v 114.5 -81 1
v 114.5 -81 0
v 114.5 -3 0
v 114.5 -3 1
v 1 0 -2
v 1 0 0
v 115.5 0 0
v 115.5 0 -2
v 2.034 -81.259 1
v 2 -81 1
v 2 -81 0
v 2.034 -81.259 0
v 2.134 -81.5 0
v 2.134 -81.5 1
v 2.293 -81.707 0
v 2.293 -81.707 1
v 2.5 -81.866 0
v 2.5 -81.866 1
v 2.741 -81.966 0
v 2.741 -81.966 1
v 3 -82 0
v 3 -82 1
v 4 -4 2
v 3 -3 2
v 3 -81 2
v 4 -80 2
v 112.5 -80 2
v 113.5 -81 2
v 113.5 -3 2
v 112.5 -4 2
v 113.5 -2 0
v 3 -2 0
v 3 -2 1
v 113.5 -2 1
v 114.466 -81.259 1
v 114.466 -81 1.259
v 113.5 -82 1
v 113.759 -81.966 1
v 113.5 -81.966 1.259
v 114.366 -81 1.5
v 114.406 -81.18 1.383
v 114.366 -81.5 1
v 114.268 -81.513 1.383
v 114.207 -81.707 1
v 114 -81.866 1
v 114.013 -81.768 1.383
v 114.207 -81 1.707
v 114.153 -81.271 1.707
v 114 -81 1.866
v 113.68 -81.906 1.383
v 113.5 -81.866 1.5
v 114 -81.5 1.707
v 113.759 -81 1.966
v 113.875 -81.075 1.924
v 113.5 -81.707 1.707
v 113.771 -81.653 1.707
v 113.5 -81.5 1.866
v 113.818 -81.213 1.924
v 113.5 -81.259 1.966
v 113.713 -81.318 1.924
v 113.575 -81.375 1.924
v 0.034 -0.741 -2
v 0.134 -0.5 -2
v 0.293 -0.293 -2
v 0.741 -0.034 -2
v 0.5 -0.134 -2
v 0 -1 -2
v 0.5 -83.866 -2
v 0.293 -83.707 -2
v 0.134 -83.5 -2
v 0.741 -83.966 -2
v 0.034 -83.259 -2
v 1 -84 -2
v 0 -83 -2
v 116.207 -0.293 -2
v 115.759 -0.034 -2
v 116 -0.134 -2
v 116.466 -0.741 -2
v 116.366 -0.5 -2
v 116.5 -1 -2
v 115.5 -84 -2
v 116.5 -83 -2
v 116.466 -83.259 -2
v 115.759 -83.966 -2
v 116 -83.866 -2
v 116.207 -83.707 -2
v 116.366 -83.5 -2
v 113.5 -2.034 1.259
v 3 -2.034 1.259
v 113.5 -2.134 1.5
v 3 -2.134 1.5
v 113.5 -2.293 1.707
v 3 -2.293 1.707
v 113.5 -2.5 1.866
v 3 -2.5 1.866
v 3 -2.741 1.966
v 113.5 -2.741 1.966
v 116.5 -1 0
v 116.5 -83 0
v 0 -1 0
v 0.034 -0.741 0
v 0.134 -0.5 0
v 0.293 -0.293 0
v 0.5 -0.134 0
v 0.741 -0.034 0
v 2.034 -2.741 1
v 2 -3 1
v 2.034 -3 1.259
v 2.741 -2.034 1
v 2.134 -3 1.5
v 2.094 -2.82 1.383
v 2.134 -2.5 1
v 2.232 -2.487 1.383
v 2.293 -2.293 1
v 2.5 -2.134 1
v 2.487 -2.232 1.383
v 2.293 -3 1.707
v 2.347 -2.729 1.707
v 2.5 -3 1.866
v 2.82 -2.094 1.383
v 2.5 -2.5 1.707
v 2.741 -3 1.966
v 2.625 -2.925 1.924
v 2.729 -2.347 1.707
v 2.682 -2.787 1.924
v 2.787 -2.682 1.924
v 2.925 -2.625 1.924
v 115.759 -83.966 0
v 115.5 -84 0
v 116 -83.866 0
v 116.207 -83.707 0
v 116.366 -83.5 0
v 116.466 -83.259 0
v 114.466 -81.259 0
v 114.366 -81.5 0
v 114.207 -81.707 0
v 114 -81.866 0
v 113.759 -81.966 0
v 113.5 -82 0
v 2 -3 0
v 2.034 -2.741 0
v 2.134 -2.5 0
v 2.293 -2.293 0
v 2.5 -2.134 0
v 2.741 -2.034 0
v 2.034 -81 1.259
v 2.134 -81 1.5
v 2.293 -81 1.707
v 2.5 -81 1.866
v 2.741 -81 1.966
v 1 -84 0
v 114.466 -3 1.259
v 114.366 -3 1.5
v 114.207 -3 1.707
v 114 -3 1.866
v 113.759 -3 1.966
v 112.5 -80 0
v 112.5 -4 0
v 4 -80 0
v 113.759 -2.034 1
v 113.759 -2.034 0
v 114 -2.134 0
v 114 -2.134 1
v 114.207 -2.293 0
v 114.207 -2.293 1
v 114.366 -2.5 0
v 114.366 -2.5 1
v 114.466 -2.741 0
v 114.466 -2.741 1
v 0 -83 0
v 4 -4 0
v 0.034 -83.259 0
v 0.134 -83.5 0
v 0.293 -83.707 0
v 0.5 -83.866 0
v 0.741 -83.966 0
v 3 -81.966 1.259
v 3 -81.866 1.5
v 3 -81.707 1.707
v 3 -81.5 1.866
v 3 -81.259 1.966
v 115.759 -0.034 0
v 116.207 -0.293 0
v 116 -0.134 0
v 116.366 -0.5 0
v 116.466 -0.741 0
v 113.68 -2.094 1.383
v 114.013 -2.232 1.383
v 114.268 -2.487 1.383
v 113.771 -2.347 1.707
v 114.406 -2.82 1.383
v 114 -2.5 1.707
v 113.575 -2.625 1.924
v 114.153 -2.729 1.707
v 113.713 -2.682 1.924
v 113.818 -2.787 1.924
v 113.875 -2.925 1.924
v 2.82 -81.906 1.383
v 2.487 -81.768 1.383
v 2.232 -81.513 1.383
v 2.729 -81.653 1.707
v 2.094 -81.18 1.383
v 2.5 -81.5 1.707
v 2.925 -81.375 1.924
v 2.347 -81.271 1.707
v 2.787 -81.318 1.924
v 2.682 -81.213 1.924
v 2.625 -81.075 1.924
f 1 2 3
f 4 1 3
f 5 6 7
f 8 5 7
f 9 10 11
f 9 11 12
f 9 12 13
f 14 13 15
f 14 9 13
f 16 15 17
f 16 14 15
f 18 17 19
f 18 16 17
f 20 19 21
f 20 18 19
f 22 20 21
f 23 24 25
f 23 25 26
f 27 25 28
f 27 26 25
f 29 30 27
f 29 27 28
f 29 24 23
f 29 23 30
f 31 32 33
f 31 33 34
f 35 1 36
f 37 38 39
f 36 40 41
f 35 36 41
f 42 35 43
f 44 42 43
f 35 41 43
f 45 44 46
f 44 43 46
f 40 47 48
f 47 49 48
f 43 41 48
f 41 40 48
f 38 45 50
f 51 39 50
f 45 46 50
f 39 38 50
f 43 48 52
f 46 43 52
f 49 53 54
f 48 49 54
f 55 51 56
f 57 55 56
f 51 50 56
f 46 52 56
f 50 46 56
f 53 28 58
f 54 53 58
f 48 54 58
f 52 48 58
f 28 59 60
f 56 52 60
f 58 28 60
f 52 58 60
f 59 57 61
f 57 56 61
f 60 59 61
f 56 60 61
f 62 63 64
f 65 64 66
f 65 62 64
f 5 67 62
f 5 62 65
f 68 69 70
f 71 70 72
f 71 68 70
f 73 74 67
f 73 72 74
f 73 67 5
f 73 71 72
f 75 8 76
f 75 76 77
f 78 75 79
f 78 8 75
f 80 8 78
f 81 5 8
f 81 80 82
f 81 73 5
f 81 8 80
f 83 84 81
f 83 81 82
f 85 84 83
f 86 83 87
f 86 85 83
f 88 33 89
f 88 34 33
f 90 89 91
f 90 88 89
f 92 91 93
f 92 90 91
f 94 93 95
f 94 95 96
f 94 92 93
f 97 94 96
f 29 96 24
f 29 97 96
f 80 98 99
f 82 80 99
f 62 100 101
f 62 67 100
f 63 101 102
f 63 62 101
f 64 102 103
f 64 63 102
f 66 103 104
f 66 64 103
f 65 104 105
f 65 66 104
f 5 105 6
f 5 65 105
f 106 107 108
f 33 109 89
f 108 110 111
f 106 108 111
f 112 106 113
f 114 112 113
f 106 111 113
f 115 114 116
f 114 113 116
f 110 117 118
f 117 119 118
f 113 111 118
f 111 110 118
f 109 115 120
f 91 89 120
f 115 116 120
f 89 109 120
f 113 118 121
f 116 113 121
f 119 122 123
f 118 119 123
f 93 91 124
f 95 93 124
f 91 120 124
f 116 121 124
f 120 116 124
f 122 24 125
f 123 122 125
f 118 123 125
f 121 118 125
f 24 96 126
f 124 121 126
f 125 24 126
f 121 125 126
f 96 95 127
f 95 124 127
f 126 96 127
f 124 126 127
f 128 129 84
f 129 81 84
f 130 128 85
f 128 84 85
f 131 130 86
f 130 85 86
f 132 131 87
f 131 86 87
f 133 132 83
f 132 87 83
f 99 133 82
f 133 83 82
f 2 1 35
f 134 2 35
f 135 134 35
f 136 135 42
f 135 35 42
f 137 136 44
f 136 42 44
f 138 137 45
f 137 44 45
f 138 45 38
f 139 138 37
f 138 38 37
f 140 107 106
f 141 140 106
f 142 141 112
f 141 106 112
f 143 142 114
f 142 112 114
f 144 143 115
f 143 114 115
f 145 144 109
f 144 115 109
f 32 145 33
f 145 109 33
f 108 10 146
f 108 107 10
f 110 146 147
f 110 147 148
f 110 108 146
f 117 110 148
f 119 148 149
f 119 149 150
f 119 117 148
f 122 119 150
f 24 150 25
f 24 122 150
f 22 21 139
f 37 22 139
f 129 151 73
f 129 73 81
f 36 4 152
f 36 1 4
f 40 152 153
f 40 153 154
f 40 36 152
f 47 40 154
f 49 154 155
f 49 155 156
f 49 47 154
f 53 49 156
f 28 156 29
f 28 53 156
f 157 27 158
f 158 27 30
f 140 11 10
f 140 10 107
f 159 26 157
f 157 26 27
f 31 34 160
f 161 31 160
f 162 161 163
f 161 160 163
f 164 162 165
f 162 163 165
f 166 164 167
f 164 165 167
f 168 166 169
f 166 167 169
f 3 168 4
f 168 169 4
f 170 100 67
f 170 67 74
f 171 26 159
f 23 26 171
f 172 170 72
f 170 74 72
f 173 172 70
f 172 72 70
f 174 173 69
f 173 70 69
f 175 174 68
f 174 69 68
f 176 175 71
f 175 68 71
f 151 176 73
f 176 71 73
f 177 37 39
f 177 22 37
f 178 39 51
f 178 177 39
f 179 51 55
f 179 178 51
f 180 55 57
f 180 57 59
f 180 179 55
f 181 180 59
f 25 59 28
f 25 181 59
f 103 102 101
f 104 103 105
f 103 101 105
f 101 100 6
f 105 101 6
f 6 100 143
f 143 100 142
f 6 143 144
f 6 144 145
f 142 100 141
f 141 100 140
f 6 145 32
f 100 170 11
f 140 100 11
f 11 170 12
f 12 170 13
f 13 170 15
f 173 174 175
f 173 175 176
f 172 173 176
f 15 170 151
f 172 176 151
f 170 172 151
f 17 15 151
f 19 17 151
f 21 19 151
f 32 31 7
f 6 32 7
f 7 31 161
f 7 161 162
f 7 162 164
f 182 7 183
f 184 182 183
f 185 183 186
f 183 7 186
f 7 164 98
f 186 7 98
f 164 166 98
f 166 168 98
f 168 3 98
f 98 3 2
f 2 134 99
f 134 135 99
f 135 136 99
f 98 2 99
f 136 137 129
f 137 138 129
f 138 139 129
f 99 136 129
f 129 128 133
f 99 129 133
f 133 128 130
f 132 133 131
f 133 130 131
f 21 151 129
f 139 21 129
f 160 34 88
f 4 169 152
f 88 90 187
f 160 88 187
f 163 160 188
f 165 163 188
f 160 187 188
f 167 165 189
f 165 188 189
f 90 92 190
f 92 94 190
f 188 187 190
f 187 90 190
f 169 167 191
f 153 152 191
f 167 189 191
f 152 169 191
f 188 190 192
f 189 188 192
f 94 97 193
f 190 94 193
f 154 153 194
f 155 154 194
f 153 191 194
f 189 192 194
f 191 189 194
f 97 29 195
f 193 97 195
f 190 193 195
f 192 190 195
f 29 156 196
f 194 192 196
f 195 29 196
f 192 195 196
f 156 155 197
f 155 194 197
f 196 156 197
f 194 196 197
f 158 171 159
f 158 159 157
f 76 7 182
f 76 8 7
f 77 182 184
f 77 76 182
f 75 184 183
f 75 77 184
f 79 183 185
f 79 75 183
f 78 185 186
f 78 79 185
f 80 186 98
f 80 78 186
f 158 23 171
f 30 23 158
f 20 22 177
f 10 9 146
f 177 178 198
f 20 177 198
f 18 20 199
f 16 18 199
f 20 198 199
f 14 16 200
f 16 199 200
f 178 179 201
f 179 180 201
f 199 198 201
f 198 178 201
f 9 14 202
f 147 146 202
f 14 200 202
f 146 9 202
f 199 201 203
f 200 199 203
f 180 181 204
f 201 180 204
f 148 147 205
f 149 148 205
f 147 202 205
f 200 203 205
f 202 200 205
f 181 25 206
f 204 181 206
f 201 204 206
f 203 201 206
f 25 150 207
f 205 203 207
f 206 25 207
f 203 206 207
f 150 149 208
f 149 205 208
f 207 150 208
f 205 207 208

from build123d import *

# Parameters (mm, degrees)
SKETCH007_W     = 116.5
SKETCH007_H     = 84
PAD002_DEPTH    = 2
SKETCH008_W     = 112.5
SKETCH008_H     = 80
PAD003_DEPTH    = 2
SKETCH009_W     = 108.5
SKETCH009_H     = 76
POCKET004_DEPTH = 2
FILLET008_R     = 1
FILLET009_R     = 1


with BuildPart() as part:
    # Sketch007 → Pad002 (new body)
    with BuildSketch(Plane(origin=(0, 0, 0), x_dir=(1, 0, 0), z_dir=(0, 0, -1))):
        with Locations((58.25, 42)):
            Rectangle(SKETCH007_W, SKETCH007_H)
    extrude(amount=PAD002_DEPTH)

    # Sketch008 (on Face5 of Pad002) → Pad003 (new body)
    with BuildSketch(Plane.XY):
        with Locations((58.25, -42)):
            Rectangle(SKETCH008_W, SKETCH008_H)
    extrude(amount=PAD003_DEPTH)

    # Sketch009 (on Face11 of Pad003) → Pocket004 (cut)
    with BuildSketch(Plane.XY.offset(2)):
        with Locations((58.25, -42)):
            Rectangle(SKETCH009_W, SKETCH009_H)
    extrude(amount=-POCKET004_DEPTH, mode=Mode.SUBTRACT)

    # Fillet008
    fillet008_edges = [part.edges().sort_by_distance(p)[0] for p in [
        (0, 0, -1),
        (116.5, 0, -1),
        (0, -84, -1),
        (116.5, -84, -1),
        (114.5, -82, 1),
        (2, -82, 1),
        (114.5, -2, 1),
        (2, -2, 1),
    ]]
    fillet(fillet008_edges, radius=FILLET008_R)

    # Fillet009
    fillet009_edges = [part.edges().sort_by_distance(p)[0] for p in [
        (58.25, -2, 2),
    ]]
    fillet(fillet009_edges, radius=FILLET009_R)


solid = part.part
